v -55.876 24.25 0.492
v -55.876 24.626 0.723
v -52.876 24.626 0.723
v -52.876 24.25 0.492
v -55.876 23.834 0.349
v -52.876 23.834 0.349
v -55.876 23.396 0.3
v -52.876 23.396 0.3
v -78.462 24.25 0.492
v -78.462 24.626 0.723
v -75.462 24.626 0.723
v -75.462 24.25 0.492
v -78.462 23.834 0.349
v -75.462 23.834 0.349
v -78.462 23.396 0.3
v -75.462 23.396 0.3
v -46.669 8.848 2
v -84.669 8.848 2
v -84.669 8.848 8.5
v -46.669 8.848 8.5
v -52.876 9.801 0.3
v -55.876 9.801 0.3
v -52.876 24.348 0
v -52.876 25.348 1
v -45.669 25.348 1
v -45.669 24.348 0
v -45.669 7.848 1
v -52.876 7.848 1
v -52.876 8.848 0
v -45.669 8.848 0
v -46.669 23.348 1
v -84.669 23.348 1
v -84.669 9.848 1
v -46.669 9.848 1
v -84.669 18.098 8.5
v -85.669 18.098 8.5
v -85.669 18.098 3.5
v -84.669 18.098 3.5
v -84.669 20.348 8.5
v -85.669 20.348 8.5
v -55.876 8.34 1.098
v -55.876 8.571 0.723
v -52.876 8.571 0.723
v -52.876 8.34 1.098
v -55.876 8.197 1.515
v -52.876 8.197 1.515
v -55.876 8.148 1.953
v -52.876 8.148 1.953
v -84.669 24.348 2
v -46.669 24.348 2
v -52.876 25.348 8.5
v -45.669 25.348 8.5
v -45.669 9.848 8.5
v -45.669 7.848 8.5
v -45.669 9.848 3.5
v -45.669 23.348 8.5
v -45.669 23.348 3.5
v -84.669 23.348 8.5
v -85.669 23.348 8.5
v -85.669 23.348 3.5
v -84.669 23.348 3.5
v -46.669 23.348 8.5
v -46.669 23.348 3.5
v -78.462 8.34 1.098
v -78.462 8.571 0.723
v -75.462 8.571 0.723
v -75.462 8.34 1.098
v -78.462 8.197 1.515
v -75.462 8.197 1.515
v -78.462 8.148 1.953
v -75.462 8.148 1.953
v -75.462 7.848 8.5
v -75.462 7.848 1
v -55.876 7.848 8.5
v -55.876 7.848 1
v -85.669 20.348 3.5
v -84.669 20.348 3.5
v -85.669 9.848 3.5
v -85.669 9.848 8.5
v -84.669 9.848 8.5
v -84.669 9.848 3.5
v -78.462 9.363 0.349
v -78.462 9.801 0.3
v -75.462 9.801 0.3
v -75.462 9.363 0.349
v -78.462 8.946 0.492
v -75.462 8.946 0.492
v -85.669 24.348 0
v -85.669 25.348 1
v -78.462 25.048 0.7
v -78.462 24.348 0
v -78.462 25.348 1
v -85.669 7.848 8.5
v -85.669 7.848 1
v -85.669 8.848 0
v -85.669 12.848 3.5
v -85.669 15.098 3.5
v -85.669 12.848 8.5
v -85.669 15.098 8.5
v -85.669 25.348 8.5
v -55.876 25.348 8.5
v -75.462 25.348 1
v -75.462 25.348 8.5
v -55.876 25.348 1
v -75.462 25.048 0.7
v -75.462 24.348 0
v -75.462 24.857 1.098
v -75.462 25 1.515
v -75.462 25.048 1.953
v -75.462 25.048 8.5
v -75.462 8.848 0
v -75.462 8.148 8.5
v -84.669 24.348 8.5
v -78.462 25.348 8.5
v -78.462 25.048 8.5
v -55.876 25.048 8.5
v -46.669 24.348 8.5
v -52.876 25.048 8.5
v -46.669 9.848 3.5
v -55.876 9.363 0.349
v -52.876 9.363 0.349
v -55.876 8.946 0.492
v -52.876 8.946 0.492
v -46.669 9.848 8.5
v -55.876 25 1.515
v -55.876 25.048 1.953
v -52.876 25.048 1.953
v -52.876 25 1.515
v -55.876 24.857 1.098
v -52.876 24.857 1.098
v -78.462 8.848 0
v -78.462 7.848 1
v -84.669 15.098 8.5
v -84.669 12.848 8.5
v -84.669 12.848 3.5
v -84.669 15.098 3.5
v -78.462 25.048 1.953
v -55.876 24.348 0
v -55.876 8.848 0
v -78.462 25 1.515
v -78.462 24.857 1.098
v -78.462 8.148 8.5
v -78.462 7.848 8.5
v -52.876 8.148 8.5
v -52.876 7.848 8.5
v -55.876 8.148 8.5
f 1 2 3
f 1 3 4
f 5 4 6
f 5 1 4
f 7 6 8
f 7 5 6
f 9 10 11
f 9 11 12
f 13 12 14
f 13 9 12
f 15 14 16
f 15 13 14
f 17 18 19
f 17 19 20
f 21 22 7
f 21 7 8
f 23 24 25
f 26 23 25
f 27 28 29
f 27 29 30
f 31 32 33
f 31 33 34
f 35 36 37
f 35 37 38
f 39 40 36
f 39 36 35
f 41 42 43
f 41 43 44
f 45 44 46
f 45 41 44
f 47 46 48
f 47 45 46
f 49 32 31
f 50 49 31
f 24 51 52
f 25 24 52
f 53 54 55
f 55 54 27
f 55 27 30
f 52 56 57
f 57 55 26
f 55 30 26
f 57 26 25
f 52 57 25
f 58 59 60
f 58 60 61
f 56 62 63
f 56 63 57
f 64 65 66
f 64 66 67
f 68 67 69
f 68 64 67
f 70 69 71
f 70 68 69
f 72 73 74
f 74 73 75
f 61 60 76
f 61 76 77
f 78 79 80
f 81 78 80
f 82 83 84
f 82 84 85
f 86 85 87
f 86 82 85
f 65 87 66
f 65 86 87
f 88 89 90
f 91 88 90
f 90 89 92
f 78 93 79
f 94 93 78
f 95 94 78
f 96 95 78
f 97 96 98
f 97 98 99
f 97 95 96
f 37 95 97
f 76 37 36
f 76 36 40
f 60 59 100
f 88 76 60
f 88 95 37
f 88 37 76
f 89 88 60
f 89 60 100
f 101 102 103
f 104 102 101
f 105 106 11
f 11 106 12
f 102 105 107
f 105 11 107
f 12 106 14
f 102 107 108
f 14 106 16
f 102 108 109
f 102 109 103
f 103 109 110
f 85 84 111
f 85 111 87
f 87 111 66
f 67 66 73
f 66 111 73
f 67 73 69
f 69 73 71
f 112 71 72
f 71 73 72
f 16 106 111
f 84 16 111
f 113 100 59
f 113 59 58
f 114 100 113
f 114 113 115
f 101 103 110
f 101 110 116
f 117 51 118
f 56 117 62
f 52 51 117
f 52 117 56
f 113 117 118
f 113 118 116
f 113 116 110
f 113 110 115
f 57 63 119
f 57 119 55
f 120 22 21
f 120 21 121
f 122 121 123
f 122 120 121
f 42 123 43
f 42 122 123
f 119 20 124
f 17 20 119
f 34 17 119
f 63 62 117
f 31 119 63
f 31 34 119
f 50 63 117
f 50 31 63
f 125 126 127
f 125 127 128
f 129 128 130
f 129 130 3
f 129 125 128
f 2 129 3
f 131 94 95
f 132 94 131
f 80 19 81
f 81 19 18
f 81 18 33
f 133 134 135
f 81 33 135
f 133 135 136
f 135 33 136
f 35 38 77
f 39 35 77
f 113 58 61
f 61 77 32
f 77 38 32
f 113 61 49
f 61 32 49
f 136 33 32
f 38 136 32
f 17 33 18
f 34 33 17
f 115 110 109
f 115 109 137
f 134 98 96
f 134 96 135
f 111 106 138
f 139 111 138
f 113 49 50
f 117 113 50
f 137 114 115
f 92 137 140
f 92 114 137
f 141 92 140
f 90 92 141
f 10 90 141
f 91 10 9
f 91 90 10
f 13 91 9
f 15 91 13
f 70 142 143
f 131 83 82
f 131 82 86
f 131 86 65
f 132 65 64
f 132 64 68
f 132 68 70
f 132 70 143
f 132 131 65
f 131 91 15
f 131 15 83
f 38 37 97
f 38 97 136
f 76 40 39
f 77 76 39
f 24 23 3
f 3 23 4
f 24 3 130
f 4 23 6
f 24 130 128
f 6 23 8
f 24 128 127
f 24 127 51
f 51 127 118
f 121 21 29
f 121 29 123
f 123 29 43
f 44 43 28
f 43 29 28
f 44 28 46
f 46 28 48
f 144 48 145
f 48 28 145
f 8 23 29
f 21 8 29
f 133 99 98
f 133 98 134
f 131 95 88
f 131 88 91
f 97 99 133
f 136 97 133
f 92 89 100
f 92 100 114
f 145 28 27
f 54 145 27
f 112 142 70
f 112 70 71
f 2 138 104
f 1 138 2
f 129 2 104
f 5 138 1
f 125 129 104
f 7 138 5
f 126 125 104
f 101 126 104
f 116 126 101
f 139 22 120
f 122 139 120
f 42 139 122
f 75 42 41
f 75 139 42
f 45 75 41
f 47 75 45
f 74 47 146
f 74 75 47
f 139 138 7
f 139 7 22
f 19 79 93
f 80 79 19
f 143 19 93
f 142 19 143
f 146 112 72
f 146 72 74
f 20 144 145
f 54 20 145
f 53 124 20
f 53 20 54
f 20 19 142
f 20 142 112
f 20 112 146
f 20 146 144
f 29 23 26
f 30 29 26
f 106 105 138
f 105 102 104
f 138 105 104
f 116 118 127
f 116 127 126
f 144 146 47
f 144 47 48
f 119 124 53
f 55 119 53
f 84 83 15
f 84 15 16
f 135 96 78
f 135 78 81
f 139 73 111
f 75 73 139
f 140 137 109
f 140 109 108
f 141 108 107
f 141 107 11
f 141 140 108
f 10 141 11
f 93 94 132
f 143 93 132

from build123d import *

# Parameters (mm, degrees)
F0_W         = 40
F0_H         = 17.5
F1_DEPTH     = 8.5
F2_T         = -1
F3_W         = 1
F3_H         = 3
F4_DEPTH     = 5
F5_SIZE      = 1
F8_W         = 3
F8_H         = 1
F8_H_2       = 7.5
F11_DEPTH    = 0.3
F7_W         = 3
F7_H         = 1.4142135624
F12_DEPTH    = 0.3
F6_W         = 3
F6_H         = 15.5
F13_DEPTH    = 0.3
F9_W         = 3
F9_H         = 7.5
F14_DEPTH    = 0.3
F10_W        = 3
F10_H        = 5.3033008589
F10_H_2      = 1.4142135624
F15_DEPTH    = 0.3
F16_T1_DEPTH = 3
F16_T3_DEPTH = 3
F18_W        = 2.25
F18_H        = 5
F19_DEPTH    = 25


# Not quite as in the source:
# - a fillet or chamfer that OpenCascade refuses, or shapes differently, is made with other operations: its cross-section is extruded or revolved along the edge and cut away or added
# - two fillets or chamfers of one size are made in one step


with BuildPart() as f1:
    # F0 (on Top) → F1 (new body)
    with BuildSketch(Plane.XY):
        with Locations((-65.668810606, 16.5984117985)):
            Rectangle(F0_W, F0_H)
    extrude(amount=F1_DEPTH)

    # F2
    f2_openings = [f1.faces().sort_by_distance(p)[0] for p in [
        (-65.668811, 16.598412, 8.5),
    ]]
    offset(amount=F2_T, openings=f2_openings)

    # F3 (on face) → F4 (cut)
    with BuildSketch(Plane.XY.offset(8.5)):
        with Locations((-85.168810606, 21.8484117985)):
            Rectangle(F3_W, F3_H)
        with Locations((-85.168810606, 16.5984117985)):
            Rectangle(F3_W, F3_H)
        with Locations((-85.168810606, 11.3484117985)):
            Rectangle(F3_W, F3_H)
        with Locations((-46.168810606, 11.3484117985)):
            Rectangle(F3_W, F3_H)
        with Locations((-46.168810606, 16.5984117985)):
            Rectangle(F3_W, F3_H)
        with Locations((-46.168810606, 21.8484117985)):
            Rectangle(F3_W, F3_H)
    extrude(amount=-F4_DEPTH, mode=Mode.SUBTRACT)

    # F5
    f5_edges = [f1.edges().sort_by_distance(p)[0] for p in [
        (-65.668811, 7.848412, 0),
        (-65.668811, 25.348412, 0),
        (-65.668811, 24.348412, 1),
        (-65.668811, 8.848412, 1),
    ]]
    chamfer(f5_edges, length=F5_SIZE)

    # F8 (on face) → F11 (cut)
    with BuildSketch(Plane(origin=(0, 25.3484117985, 0), x_dir=(-1, 0, 0), z_dir=(0, 1, 0))):
        with Locations((76.9616991878, 0.5)):
            Rectangle(F8_W, F8_H)
        with Locations((76.9616991878, 4.75)):
            Rectangle(F8_W, F8_H_2)
        with Locations((54.3759220243, 4.75)):
            Rectangle(F8_W, F8_H_2)
    extrude(amount=-F11_DEPTH, mode=Mode.SUBTRACT)

    # F7 (on face) → F12 (cut)
    with BuildSketch(Plane(origin=(0, 12.1742058992, -12.1742058992), x_dir=(1, 0, 0), z_dir=(0, 0.7071067812, -0.7071067812))):
        with Locations((-76.9616991878, -17.924033875)):
            Rectangle(F7_W, F7_H)
        with Locations((-54.3759220243, -17.924033875)):
            Rectangle(F7_W, F7_H)
    extrude(amount=-F12_DEPTH, mode=Mode.SUBTRACT)

    # F6 (on face) → F13 (cut)
    with BuildSketch(Plane(origin=(0, 0, 0), x_dir=(1, 0, 0), z_dir=(0, 0, -1))):
        with Locations((-76.9616991878, -16.5984117985)):
            Rectangle(F6_W, F6_H)
        with Locations((-54.3759220243, -16.5984117985)):
            Rectangle(F6_W, F6_H)
    extrude(amount=-F13_DEPTH, mode=Mode.SUBTRACT)

    # F9 (on face) → F14 (cut)
    with BuildSketch(Plane.XZ.offset(-7.8484117985)):
        with Locations((-76.9616991878, 4.75)):
            Rectangle(F9_W, F9_H)
        with Locations((-54.3759220243, 4.75)):
            Rectangle(F9_W, F9_H)
    extrude(amount=-F14_DEPTH, mode=Mode.SUBTRACT)

    # F10 (on face) → F15 (cut)
    with BuildSketch(Plane(origin=(0, 4.4242058992, 4.4242058992), x_dir=(1, 0, 0), z_dir=(0, -0.7071067812, -0.7071067812))):
        with Locations((-76.9616991878, -2.1909079936)):
            Rectangle(F10_W, F10_H)
        with Locations((-76.9616991878, -5.5496652042)):
            Rectangle(F10_W, F10_H_2)
        with Locations((-54.3759220243, -5.5496652042)):
            Rectangle(F10_W, F10_H_2)
    extrude(amount=-F15_DEPTH, mode=Mode.SUBTRACT)

    # F16: fillet of radius 2 on 8 edges, made by hand

    # F16_s2 → F16_t1 (cut)
    with BuildSketch(Plane.YZ.offset(-55.8759220243)):
        with BuildLine():
            ThreePointArc((8.7341982361, 0.5384776311), (8.3006527335, 1.1873243287), (8.1484117985, 1.9526911935))
            Line((8.1484117985, 1.9526911935), (8.1484117985, 1.1242640687))
            Line((8.1484117985, 1.1242640687), (8.7341982361, 0.5384776311))
        make_face()
        with BuildLine():
            ThreePointArc((9.8011029919, 0.3), (9.0357361272, 0.452240935), (8.3868894296, 0.8857864376))
            Line((8.3868894296, 0.8857864376), (8.9726758672, 0.3))
            Line((8.9726758672, 0.3), (9.8011029919, 0.3))
        make_face()
        with BuildLine():
            ThreePointArc((25.0484117985, 1.9526911935), (24.8961708635, 1.1873243287), (24.4626253609, 0.5384776311))
            Line((24.4626253609, 0.5384776311), (25.0484117985, 1.1242640687))
            Line((25.0484117985, 1.1242640687), (25.0484117985, 1.9526911935))
        make_face()
        with BuildLine():
            ThreePointArc((24.8099341674, 0.8857864376), (24.1610874697, 0.452240935), (23.395720605, 0.3))
            Line((23.395720605, 0.3), (24.2241477298, 0.3))
            Line((24.2241477298, 0.3), (24.8099341674, 0.8857864376))
        make_face()
    extrude(amount=F16_T1_DEPTH, mode=Mode.SUBTRACT)

    # F16_s4 → F16_t3 (cut)
    with BuildSketch(Plane.YZ.offset(-78.4616991878)):
        with BuildLine():
            ThreePointArc((9.8011029919, 0.3), (9.0357361272, 0.452240935), (8.3868894296, 0.8857864376))
            Line((8.3868894296, 0.8857864376), (8.9726758672, 0.3))
            Line((8.9726758672, 0.3), (9.8011029919, 0.3))
        make_face()
        with BuildLine():
            ThreePointArc((8.7341982361, 0.5384776311), (8.3006527335, 1.1873243287), (8.1484117985, 1.9526911935))
            Line((8.1484117985, 1.9526911935), (8.1484117985, 1.1242640687))
            Line((8.1484117985, 1.1242640687), (8.7341982361, 0.5384776311))
        make_face()
        with BuildLine():
            ThreePointArc((24.8099341674, 0.8857864376), (24.1610874697, 0.452240935), (23.395720605, 0.3))
            Line((23.395720605, 0.3), (24.2241477298, 0.3))
            Line((24.2241477298, 0.3), (24.8099341674, 0.8857864376))
        make_face()
        with BuildLine():
            ThreePointArc((25.0484117985, 1.9526911935), (24.8961708635, 1.1873243287), (24.4626253609, 0.5384776311))
            Line((24.4626253609, 0.5384776311), (25.0484117985, 1.1242640687))
            Line((25.0484117985, 1.1242640687), (25.0484117985, 1.9526911935))
        make_face()
    extrude(amount=F16_T3_DEPTH, mode=Mode.SUBTRACT)

    # F18 (on face) → F19 (cut)
    with BuildSketch(Plane.YZ.offset(-45.668810606)):
        with Locations((13.9734117985, 6)):
            Rectangle(F18_W, F18_H)
        with Locations((19.2234117985, 6)):
            Rectangle(F18_W, F18_H)
    extrude(amount=-F19_DEPTH, mode=Mode.SUBTRACT)


solid = f1.part
